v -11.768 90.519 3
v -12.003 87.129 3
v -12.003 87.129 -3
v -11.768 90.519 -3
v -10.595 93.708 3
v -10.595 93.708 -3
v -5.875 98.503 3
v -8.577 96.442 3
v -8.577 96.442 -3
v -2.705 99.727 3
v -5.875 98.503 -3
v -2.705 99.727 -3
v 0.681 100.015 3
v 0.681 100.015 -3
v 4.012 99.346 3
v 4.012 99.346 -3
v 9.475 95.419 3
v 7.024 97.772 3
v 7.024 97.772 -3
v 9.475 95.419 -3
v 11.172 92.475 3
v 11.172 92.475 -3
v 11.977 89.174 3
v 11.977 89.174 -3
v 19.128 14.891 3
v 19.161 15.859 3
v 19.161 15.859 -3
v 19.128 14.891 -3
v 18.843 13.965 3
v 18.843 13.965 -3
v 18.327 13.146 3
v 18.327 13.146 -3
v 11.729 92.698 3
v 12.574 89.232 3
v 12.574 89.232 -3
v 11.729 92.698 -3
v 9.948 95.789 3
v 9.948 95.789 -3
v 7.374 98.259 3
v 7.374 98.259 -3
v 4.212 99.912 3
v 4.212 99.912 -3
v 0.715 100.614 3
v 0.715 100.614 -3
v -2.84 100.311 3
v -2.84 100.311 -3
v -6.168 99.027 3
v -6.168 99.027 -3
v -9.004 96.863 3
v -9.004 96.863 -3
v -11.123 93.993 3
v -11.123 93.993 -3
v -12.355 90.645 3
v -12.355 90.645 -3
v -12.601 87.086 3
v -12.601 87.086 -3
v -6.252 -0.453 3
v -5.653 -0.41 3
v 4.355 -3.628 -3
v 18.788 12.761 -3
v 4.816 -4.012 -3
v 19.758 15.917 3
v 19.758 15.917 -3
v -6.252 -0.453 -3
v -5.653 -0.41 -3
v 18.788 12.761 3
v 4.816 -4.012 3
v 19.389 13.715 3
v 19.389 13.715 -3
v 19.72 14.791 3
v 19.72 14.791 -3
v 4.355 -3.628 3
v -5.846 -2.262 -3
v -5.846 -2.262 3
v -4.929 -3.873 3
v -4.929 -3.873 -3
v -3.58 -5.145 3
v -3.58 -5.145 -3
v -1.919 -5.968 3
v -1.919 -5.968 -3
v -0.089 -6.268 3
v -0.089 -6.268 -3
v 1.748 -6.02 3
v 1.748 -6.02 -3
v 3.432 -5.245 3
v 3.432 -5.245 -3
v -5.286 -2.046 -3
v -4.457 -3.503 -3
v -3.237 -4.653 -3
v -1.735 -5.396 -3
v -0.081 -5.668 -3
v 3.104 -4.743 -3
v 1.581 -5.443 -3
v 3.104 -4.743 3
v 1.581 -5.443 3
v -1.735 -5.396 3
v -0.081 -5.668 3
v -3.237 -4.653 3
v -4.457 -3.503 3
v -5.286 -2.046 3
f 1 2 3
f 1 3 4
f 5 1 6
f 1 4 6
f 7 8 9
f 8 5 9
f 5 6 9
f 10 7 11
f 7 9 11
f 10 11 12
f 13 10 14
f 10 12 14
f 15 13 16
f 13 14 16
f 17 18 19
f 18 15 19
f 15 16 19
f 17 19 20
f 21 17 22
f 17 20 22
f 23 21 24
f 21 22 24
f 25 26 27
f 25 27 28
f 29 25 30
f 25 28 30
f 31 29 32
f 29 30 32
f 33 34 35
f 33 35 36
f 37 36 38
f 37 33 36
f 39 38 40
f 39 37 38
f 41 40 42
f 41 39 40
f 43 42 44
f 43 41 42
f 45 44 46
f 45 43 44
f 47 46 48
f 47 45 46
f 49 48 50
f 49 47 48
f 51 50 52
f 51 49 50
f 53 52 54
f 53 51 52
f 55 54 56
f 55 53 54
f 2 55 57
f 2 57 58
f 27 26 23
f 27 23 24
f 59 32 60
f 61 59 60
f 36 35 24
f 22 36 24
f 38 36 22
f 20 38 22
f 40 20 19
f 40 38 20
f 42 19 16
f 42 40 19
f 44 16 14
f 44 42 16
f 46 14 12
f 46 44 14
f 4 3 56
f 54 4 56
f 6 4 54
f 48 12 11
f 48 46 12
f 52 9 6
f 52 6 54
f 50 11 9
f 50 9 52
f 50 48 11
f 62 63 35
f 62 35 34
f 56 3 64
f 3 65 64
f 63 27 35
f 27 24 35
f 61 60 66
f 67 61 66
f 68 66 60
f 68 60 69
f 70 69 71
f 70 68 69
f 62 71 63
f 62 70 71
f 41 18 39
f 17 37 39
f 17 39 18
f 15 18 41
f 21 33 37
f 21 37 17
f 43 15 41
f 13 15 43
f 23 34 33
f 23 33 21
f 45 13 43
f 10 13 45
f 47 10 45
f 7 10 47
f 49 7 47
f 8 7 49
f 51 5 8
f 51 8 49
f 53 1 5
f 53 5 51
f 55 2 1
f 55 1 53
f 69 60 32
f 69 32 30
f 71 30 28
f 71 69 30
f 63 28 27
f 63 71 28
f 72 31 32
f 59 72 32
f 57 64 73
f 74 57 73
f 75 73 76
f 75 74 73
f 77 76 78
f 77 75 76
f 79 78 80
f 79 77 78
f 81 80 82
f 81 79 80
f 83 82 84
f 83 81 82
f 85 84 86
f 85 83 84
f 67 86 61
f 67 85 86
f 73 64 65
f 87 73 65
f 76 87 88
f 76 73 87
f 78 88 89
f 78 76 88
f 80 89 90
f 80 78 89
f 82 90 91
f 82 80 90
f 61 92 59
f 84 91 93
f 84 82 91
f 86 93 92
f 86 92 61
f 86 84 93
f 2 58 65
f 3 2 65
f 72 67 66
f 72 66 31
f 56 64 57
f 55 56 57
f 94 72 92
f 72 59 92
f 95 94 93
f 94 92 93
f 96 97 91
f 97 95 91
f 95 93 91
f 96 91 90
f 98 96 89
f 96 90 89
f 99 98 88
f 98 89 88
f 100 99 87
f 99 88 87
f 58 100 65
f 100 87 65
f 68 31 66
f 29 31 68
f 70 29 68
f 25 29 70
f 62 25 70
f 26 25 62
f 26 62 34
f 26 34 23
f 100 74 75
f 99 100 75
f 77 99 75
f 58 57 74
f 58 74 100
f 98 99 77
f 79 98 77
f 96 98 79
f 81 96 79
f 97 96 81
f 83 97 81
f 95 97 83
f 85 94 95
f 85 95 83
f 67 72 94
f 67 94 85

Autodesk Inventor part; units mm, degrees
sketch "Sketch Path" plane through (0, 0, 0) normal (0, 0, 1) x (1, 0, 0)
  arc A0 (-5.9527, -0.4318) -> (4.5858, -3.8198) centre (0, 0) ccw
  arc A1 (18.5572, 12.9535) -> (19.4599, 15.888) centre (15.5, 15.5) ccw
  arc A2 (12.2757, 89.2029) -> (-12.3022, 87.1077) centre (0, 88) ccw
  line L0 (-12.3022, 87.1077) -> (-5.9527, -0.4318)
  line L1 (4.5858, -3.8198) -> (18.5572, 12.9535)
  line L2 (19.4599, 15.888) -> (12.2757, 89.2029)
ref_plane "Cross Section Plane" through (-5.9527, -0.4318, 0) normal (-0.0723, 0.9974, 0) x (0, 0, 1)
ref_plane "Work Plane2" through (0, 0, 0) normal (-1, 0, 0) x (0, 0, 1)
ref_plane "Work Plane3" through (15.5, 15.5, 0) normal (0.2665, 0.9638, 0) x (0, 0, 1)
ref_plane "Work Plane4" through (0, 88, 0) normal (-0.286, 0.9582, 0) x (0, 0, 1)
sketch "Cross Section" plane through (-5.9527, -0.4318, 0) normal (-0.0723, 0.9974, 0) x (0, 0, 1)
  line L0 (-3, 0.3) -> (3, 0.3)
  line L1 (3, 0.3) -> (3, -0.3)
  line L2 (3, -0.3) -> (-3, -0.3)
  line L3 (-3, -0.3) -> (-3, 0.3)
  line L4 (-3, 0) -> (3, 0) construction
  point P0 (0, 0)
  point P1 (0, 0)
  dimension "d0" = 6
  dimension "d4" = 0.3
  dimension "d5" = 0.3
sweep "Belt" add profiles "Cross Section" path "Sketch Path"
equation "\"d0\" = da_B"
equation "\"d4\" = da_a"
equation "\"d5\" = da_a2"
equation "\"da_B\" = 6"
equation "\"da_pb\" = 2.5"
equation "\"da_L\" = 239.02838"
equation "\"da_a\" = 0.3"
equation "\"da_S\" = 1.5"
equation "\"da_Beta\" = 20deg"
equation "\"da_Ht\" = 0.7"
equation "\"da_H\" = 1.3"
equation "\"da_a2\" = 0.3"
properties part number "Synchronous Belt" material "Rubber"
